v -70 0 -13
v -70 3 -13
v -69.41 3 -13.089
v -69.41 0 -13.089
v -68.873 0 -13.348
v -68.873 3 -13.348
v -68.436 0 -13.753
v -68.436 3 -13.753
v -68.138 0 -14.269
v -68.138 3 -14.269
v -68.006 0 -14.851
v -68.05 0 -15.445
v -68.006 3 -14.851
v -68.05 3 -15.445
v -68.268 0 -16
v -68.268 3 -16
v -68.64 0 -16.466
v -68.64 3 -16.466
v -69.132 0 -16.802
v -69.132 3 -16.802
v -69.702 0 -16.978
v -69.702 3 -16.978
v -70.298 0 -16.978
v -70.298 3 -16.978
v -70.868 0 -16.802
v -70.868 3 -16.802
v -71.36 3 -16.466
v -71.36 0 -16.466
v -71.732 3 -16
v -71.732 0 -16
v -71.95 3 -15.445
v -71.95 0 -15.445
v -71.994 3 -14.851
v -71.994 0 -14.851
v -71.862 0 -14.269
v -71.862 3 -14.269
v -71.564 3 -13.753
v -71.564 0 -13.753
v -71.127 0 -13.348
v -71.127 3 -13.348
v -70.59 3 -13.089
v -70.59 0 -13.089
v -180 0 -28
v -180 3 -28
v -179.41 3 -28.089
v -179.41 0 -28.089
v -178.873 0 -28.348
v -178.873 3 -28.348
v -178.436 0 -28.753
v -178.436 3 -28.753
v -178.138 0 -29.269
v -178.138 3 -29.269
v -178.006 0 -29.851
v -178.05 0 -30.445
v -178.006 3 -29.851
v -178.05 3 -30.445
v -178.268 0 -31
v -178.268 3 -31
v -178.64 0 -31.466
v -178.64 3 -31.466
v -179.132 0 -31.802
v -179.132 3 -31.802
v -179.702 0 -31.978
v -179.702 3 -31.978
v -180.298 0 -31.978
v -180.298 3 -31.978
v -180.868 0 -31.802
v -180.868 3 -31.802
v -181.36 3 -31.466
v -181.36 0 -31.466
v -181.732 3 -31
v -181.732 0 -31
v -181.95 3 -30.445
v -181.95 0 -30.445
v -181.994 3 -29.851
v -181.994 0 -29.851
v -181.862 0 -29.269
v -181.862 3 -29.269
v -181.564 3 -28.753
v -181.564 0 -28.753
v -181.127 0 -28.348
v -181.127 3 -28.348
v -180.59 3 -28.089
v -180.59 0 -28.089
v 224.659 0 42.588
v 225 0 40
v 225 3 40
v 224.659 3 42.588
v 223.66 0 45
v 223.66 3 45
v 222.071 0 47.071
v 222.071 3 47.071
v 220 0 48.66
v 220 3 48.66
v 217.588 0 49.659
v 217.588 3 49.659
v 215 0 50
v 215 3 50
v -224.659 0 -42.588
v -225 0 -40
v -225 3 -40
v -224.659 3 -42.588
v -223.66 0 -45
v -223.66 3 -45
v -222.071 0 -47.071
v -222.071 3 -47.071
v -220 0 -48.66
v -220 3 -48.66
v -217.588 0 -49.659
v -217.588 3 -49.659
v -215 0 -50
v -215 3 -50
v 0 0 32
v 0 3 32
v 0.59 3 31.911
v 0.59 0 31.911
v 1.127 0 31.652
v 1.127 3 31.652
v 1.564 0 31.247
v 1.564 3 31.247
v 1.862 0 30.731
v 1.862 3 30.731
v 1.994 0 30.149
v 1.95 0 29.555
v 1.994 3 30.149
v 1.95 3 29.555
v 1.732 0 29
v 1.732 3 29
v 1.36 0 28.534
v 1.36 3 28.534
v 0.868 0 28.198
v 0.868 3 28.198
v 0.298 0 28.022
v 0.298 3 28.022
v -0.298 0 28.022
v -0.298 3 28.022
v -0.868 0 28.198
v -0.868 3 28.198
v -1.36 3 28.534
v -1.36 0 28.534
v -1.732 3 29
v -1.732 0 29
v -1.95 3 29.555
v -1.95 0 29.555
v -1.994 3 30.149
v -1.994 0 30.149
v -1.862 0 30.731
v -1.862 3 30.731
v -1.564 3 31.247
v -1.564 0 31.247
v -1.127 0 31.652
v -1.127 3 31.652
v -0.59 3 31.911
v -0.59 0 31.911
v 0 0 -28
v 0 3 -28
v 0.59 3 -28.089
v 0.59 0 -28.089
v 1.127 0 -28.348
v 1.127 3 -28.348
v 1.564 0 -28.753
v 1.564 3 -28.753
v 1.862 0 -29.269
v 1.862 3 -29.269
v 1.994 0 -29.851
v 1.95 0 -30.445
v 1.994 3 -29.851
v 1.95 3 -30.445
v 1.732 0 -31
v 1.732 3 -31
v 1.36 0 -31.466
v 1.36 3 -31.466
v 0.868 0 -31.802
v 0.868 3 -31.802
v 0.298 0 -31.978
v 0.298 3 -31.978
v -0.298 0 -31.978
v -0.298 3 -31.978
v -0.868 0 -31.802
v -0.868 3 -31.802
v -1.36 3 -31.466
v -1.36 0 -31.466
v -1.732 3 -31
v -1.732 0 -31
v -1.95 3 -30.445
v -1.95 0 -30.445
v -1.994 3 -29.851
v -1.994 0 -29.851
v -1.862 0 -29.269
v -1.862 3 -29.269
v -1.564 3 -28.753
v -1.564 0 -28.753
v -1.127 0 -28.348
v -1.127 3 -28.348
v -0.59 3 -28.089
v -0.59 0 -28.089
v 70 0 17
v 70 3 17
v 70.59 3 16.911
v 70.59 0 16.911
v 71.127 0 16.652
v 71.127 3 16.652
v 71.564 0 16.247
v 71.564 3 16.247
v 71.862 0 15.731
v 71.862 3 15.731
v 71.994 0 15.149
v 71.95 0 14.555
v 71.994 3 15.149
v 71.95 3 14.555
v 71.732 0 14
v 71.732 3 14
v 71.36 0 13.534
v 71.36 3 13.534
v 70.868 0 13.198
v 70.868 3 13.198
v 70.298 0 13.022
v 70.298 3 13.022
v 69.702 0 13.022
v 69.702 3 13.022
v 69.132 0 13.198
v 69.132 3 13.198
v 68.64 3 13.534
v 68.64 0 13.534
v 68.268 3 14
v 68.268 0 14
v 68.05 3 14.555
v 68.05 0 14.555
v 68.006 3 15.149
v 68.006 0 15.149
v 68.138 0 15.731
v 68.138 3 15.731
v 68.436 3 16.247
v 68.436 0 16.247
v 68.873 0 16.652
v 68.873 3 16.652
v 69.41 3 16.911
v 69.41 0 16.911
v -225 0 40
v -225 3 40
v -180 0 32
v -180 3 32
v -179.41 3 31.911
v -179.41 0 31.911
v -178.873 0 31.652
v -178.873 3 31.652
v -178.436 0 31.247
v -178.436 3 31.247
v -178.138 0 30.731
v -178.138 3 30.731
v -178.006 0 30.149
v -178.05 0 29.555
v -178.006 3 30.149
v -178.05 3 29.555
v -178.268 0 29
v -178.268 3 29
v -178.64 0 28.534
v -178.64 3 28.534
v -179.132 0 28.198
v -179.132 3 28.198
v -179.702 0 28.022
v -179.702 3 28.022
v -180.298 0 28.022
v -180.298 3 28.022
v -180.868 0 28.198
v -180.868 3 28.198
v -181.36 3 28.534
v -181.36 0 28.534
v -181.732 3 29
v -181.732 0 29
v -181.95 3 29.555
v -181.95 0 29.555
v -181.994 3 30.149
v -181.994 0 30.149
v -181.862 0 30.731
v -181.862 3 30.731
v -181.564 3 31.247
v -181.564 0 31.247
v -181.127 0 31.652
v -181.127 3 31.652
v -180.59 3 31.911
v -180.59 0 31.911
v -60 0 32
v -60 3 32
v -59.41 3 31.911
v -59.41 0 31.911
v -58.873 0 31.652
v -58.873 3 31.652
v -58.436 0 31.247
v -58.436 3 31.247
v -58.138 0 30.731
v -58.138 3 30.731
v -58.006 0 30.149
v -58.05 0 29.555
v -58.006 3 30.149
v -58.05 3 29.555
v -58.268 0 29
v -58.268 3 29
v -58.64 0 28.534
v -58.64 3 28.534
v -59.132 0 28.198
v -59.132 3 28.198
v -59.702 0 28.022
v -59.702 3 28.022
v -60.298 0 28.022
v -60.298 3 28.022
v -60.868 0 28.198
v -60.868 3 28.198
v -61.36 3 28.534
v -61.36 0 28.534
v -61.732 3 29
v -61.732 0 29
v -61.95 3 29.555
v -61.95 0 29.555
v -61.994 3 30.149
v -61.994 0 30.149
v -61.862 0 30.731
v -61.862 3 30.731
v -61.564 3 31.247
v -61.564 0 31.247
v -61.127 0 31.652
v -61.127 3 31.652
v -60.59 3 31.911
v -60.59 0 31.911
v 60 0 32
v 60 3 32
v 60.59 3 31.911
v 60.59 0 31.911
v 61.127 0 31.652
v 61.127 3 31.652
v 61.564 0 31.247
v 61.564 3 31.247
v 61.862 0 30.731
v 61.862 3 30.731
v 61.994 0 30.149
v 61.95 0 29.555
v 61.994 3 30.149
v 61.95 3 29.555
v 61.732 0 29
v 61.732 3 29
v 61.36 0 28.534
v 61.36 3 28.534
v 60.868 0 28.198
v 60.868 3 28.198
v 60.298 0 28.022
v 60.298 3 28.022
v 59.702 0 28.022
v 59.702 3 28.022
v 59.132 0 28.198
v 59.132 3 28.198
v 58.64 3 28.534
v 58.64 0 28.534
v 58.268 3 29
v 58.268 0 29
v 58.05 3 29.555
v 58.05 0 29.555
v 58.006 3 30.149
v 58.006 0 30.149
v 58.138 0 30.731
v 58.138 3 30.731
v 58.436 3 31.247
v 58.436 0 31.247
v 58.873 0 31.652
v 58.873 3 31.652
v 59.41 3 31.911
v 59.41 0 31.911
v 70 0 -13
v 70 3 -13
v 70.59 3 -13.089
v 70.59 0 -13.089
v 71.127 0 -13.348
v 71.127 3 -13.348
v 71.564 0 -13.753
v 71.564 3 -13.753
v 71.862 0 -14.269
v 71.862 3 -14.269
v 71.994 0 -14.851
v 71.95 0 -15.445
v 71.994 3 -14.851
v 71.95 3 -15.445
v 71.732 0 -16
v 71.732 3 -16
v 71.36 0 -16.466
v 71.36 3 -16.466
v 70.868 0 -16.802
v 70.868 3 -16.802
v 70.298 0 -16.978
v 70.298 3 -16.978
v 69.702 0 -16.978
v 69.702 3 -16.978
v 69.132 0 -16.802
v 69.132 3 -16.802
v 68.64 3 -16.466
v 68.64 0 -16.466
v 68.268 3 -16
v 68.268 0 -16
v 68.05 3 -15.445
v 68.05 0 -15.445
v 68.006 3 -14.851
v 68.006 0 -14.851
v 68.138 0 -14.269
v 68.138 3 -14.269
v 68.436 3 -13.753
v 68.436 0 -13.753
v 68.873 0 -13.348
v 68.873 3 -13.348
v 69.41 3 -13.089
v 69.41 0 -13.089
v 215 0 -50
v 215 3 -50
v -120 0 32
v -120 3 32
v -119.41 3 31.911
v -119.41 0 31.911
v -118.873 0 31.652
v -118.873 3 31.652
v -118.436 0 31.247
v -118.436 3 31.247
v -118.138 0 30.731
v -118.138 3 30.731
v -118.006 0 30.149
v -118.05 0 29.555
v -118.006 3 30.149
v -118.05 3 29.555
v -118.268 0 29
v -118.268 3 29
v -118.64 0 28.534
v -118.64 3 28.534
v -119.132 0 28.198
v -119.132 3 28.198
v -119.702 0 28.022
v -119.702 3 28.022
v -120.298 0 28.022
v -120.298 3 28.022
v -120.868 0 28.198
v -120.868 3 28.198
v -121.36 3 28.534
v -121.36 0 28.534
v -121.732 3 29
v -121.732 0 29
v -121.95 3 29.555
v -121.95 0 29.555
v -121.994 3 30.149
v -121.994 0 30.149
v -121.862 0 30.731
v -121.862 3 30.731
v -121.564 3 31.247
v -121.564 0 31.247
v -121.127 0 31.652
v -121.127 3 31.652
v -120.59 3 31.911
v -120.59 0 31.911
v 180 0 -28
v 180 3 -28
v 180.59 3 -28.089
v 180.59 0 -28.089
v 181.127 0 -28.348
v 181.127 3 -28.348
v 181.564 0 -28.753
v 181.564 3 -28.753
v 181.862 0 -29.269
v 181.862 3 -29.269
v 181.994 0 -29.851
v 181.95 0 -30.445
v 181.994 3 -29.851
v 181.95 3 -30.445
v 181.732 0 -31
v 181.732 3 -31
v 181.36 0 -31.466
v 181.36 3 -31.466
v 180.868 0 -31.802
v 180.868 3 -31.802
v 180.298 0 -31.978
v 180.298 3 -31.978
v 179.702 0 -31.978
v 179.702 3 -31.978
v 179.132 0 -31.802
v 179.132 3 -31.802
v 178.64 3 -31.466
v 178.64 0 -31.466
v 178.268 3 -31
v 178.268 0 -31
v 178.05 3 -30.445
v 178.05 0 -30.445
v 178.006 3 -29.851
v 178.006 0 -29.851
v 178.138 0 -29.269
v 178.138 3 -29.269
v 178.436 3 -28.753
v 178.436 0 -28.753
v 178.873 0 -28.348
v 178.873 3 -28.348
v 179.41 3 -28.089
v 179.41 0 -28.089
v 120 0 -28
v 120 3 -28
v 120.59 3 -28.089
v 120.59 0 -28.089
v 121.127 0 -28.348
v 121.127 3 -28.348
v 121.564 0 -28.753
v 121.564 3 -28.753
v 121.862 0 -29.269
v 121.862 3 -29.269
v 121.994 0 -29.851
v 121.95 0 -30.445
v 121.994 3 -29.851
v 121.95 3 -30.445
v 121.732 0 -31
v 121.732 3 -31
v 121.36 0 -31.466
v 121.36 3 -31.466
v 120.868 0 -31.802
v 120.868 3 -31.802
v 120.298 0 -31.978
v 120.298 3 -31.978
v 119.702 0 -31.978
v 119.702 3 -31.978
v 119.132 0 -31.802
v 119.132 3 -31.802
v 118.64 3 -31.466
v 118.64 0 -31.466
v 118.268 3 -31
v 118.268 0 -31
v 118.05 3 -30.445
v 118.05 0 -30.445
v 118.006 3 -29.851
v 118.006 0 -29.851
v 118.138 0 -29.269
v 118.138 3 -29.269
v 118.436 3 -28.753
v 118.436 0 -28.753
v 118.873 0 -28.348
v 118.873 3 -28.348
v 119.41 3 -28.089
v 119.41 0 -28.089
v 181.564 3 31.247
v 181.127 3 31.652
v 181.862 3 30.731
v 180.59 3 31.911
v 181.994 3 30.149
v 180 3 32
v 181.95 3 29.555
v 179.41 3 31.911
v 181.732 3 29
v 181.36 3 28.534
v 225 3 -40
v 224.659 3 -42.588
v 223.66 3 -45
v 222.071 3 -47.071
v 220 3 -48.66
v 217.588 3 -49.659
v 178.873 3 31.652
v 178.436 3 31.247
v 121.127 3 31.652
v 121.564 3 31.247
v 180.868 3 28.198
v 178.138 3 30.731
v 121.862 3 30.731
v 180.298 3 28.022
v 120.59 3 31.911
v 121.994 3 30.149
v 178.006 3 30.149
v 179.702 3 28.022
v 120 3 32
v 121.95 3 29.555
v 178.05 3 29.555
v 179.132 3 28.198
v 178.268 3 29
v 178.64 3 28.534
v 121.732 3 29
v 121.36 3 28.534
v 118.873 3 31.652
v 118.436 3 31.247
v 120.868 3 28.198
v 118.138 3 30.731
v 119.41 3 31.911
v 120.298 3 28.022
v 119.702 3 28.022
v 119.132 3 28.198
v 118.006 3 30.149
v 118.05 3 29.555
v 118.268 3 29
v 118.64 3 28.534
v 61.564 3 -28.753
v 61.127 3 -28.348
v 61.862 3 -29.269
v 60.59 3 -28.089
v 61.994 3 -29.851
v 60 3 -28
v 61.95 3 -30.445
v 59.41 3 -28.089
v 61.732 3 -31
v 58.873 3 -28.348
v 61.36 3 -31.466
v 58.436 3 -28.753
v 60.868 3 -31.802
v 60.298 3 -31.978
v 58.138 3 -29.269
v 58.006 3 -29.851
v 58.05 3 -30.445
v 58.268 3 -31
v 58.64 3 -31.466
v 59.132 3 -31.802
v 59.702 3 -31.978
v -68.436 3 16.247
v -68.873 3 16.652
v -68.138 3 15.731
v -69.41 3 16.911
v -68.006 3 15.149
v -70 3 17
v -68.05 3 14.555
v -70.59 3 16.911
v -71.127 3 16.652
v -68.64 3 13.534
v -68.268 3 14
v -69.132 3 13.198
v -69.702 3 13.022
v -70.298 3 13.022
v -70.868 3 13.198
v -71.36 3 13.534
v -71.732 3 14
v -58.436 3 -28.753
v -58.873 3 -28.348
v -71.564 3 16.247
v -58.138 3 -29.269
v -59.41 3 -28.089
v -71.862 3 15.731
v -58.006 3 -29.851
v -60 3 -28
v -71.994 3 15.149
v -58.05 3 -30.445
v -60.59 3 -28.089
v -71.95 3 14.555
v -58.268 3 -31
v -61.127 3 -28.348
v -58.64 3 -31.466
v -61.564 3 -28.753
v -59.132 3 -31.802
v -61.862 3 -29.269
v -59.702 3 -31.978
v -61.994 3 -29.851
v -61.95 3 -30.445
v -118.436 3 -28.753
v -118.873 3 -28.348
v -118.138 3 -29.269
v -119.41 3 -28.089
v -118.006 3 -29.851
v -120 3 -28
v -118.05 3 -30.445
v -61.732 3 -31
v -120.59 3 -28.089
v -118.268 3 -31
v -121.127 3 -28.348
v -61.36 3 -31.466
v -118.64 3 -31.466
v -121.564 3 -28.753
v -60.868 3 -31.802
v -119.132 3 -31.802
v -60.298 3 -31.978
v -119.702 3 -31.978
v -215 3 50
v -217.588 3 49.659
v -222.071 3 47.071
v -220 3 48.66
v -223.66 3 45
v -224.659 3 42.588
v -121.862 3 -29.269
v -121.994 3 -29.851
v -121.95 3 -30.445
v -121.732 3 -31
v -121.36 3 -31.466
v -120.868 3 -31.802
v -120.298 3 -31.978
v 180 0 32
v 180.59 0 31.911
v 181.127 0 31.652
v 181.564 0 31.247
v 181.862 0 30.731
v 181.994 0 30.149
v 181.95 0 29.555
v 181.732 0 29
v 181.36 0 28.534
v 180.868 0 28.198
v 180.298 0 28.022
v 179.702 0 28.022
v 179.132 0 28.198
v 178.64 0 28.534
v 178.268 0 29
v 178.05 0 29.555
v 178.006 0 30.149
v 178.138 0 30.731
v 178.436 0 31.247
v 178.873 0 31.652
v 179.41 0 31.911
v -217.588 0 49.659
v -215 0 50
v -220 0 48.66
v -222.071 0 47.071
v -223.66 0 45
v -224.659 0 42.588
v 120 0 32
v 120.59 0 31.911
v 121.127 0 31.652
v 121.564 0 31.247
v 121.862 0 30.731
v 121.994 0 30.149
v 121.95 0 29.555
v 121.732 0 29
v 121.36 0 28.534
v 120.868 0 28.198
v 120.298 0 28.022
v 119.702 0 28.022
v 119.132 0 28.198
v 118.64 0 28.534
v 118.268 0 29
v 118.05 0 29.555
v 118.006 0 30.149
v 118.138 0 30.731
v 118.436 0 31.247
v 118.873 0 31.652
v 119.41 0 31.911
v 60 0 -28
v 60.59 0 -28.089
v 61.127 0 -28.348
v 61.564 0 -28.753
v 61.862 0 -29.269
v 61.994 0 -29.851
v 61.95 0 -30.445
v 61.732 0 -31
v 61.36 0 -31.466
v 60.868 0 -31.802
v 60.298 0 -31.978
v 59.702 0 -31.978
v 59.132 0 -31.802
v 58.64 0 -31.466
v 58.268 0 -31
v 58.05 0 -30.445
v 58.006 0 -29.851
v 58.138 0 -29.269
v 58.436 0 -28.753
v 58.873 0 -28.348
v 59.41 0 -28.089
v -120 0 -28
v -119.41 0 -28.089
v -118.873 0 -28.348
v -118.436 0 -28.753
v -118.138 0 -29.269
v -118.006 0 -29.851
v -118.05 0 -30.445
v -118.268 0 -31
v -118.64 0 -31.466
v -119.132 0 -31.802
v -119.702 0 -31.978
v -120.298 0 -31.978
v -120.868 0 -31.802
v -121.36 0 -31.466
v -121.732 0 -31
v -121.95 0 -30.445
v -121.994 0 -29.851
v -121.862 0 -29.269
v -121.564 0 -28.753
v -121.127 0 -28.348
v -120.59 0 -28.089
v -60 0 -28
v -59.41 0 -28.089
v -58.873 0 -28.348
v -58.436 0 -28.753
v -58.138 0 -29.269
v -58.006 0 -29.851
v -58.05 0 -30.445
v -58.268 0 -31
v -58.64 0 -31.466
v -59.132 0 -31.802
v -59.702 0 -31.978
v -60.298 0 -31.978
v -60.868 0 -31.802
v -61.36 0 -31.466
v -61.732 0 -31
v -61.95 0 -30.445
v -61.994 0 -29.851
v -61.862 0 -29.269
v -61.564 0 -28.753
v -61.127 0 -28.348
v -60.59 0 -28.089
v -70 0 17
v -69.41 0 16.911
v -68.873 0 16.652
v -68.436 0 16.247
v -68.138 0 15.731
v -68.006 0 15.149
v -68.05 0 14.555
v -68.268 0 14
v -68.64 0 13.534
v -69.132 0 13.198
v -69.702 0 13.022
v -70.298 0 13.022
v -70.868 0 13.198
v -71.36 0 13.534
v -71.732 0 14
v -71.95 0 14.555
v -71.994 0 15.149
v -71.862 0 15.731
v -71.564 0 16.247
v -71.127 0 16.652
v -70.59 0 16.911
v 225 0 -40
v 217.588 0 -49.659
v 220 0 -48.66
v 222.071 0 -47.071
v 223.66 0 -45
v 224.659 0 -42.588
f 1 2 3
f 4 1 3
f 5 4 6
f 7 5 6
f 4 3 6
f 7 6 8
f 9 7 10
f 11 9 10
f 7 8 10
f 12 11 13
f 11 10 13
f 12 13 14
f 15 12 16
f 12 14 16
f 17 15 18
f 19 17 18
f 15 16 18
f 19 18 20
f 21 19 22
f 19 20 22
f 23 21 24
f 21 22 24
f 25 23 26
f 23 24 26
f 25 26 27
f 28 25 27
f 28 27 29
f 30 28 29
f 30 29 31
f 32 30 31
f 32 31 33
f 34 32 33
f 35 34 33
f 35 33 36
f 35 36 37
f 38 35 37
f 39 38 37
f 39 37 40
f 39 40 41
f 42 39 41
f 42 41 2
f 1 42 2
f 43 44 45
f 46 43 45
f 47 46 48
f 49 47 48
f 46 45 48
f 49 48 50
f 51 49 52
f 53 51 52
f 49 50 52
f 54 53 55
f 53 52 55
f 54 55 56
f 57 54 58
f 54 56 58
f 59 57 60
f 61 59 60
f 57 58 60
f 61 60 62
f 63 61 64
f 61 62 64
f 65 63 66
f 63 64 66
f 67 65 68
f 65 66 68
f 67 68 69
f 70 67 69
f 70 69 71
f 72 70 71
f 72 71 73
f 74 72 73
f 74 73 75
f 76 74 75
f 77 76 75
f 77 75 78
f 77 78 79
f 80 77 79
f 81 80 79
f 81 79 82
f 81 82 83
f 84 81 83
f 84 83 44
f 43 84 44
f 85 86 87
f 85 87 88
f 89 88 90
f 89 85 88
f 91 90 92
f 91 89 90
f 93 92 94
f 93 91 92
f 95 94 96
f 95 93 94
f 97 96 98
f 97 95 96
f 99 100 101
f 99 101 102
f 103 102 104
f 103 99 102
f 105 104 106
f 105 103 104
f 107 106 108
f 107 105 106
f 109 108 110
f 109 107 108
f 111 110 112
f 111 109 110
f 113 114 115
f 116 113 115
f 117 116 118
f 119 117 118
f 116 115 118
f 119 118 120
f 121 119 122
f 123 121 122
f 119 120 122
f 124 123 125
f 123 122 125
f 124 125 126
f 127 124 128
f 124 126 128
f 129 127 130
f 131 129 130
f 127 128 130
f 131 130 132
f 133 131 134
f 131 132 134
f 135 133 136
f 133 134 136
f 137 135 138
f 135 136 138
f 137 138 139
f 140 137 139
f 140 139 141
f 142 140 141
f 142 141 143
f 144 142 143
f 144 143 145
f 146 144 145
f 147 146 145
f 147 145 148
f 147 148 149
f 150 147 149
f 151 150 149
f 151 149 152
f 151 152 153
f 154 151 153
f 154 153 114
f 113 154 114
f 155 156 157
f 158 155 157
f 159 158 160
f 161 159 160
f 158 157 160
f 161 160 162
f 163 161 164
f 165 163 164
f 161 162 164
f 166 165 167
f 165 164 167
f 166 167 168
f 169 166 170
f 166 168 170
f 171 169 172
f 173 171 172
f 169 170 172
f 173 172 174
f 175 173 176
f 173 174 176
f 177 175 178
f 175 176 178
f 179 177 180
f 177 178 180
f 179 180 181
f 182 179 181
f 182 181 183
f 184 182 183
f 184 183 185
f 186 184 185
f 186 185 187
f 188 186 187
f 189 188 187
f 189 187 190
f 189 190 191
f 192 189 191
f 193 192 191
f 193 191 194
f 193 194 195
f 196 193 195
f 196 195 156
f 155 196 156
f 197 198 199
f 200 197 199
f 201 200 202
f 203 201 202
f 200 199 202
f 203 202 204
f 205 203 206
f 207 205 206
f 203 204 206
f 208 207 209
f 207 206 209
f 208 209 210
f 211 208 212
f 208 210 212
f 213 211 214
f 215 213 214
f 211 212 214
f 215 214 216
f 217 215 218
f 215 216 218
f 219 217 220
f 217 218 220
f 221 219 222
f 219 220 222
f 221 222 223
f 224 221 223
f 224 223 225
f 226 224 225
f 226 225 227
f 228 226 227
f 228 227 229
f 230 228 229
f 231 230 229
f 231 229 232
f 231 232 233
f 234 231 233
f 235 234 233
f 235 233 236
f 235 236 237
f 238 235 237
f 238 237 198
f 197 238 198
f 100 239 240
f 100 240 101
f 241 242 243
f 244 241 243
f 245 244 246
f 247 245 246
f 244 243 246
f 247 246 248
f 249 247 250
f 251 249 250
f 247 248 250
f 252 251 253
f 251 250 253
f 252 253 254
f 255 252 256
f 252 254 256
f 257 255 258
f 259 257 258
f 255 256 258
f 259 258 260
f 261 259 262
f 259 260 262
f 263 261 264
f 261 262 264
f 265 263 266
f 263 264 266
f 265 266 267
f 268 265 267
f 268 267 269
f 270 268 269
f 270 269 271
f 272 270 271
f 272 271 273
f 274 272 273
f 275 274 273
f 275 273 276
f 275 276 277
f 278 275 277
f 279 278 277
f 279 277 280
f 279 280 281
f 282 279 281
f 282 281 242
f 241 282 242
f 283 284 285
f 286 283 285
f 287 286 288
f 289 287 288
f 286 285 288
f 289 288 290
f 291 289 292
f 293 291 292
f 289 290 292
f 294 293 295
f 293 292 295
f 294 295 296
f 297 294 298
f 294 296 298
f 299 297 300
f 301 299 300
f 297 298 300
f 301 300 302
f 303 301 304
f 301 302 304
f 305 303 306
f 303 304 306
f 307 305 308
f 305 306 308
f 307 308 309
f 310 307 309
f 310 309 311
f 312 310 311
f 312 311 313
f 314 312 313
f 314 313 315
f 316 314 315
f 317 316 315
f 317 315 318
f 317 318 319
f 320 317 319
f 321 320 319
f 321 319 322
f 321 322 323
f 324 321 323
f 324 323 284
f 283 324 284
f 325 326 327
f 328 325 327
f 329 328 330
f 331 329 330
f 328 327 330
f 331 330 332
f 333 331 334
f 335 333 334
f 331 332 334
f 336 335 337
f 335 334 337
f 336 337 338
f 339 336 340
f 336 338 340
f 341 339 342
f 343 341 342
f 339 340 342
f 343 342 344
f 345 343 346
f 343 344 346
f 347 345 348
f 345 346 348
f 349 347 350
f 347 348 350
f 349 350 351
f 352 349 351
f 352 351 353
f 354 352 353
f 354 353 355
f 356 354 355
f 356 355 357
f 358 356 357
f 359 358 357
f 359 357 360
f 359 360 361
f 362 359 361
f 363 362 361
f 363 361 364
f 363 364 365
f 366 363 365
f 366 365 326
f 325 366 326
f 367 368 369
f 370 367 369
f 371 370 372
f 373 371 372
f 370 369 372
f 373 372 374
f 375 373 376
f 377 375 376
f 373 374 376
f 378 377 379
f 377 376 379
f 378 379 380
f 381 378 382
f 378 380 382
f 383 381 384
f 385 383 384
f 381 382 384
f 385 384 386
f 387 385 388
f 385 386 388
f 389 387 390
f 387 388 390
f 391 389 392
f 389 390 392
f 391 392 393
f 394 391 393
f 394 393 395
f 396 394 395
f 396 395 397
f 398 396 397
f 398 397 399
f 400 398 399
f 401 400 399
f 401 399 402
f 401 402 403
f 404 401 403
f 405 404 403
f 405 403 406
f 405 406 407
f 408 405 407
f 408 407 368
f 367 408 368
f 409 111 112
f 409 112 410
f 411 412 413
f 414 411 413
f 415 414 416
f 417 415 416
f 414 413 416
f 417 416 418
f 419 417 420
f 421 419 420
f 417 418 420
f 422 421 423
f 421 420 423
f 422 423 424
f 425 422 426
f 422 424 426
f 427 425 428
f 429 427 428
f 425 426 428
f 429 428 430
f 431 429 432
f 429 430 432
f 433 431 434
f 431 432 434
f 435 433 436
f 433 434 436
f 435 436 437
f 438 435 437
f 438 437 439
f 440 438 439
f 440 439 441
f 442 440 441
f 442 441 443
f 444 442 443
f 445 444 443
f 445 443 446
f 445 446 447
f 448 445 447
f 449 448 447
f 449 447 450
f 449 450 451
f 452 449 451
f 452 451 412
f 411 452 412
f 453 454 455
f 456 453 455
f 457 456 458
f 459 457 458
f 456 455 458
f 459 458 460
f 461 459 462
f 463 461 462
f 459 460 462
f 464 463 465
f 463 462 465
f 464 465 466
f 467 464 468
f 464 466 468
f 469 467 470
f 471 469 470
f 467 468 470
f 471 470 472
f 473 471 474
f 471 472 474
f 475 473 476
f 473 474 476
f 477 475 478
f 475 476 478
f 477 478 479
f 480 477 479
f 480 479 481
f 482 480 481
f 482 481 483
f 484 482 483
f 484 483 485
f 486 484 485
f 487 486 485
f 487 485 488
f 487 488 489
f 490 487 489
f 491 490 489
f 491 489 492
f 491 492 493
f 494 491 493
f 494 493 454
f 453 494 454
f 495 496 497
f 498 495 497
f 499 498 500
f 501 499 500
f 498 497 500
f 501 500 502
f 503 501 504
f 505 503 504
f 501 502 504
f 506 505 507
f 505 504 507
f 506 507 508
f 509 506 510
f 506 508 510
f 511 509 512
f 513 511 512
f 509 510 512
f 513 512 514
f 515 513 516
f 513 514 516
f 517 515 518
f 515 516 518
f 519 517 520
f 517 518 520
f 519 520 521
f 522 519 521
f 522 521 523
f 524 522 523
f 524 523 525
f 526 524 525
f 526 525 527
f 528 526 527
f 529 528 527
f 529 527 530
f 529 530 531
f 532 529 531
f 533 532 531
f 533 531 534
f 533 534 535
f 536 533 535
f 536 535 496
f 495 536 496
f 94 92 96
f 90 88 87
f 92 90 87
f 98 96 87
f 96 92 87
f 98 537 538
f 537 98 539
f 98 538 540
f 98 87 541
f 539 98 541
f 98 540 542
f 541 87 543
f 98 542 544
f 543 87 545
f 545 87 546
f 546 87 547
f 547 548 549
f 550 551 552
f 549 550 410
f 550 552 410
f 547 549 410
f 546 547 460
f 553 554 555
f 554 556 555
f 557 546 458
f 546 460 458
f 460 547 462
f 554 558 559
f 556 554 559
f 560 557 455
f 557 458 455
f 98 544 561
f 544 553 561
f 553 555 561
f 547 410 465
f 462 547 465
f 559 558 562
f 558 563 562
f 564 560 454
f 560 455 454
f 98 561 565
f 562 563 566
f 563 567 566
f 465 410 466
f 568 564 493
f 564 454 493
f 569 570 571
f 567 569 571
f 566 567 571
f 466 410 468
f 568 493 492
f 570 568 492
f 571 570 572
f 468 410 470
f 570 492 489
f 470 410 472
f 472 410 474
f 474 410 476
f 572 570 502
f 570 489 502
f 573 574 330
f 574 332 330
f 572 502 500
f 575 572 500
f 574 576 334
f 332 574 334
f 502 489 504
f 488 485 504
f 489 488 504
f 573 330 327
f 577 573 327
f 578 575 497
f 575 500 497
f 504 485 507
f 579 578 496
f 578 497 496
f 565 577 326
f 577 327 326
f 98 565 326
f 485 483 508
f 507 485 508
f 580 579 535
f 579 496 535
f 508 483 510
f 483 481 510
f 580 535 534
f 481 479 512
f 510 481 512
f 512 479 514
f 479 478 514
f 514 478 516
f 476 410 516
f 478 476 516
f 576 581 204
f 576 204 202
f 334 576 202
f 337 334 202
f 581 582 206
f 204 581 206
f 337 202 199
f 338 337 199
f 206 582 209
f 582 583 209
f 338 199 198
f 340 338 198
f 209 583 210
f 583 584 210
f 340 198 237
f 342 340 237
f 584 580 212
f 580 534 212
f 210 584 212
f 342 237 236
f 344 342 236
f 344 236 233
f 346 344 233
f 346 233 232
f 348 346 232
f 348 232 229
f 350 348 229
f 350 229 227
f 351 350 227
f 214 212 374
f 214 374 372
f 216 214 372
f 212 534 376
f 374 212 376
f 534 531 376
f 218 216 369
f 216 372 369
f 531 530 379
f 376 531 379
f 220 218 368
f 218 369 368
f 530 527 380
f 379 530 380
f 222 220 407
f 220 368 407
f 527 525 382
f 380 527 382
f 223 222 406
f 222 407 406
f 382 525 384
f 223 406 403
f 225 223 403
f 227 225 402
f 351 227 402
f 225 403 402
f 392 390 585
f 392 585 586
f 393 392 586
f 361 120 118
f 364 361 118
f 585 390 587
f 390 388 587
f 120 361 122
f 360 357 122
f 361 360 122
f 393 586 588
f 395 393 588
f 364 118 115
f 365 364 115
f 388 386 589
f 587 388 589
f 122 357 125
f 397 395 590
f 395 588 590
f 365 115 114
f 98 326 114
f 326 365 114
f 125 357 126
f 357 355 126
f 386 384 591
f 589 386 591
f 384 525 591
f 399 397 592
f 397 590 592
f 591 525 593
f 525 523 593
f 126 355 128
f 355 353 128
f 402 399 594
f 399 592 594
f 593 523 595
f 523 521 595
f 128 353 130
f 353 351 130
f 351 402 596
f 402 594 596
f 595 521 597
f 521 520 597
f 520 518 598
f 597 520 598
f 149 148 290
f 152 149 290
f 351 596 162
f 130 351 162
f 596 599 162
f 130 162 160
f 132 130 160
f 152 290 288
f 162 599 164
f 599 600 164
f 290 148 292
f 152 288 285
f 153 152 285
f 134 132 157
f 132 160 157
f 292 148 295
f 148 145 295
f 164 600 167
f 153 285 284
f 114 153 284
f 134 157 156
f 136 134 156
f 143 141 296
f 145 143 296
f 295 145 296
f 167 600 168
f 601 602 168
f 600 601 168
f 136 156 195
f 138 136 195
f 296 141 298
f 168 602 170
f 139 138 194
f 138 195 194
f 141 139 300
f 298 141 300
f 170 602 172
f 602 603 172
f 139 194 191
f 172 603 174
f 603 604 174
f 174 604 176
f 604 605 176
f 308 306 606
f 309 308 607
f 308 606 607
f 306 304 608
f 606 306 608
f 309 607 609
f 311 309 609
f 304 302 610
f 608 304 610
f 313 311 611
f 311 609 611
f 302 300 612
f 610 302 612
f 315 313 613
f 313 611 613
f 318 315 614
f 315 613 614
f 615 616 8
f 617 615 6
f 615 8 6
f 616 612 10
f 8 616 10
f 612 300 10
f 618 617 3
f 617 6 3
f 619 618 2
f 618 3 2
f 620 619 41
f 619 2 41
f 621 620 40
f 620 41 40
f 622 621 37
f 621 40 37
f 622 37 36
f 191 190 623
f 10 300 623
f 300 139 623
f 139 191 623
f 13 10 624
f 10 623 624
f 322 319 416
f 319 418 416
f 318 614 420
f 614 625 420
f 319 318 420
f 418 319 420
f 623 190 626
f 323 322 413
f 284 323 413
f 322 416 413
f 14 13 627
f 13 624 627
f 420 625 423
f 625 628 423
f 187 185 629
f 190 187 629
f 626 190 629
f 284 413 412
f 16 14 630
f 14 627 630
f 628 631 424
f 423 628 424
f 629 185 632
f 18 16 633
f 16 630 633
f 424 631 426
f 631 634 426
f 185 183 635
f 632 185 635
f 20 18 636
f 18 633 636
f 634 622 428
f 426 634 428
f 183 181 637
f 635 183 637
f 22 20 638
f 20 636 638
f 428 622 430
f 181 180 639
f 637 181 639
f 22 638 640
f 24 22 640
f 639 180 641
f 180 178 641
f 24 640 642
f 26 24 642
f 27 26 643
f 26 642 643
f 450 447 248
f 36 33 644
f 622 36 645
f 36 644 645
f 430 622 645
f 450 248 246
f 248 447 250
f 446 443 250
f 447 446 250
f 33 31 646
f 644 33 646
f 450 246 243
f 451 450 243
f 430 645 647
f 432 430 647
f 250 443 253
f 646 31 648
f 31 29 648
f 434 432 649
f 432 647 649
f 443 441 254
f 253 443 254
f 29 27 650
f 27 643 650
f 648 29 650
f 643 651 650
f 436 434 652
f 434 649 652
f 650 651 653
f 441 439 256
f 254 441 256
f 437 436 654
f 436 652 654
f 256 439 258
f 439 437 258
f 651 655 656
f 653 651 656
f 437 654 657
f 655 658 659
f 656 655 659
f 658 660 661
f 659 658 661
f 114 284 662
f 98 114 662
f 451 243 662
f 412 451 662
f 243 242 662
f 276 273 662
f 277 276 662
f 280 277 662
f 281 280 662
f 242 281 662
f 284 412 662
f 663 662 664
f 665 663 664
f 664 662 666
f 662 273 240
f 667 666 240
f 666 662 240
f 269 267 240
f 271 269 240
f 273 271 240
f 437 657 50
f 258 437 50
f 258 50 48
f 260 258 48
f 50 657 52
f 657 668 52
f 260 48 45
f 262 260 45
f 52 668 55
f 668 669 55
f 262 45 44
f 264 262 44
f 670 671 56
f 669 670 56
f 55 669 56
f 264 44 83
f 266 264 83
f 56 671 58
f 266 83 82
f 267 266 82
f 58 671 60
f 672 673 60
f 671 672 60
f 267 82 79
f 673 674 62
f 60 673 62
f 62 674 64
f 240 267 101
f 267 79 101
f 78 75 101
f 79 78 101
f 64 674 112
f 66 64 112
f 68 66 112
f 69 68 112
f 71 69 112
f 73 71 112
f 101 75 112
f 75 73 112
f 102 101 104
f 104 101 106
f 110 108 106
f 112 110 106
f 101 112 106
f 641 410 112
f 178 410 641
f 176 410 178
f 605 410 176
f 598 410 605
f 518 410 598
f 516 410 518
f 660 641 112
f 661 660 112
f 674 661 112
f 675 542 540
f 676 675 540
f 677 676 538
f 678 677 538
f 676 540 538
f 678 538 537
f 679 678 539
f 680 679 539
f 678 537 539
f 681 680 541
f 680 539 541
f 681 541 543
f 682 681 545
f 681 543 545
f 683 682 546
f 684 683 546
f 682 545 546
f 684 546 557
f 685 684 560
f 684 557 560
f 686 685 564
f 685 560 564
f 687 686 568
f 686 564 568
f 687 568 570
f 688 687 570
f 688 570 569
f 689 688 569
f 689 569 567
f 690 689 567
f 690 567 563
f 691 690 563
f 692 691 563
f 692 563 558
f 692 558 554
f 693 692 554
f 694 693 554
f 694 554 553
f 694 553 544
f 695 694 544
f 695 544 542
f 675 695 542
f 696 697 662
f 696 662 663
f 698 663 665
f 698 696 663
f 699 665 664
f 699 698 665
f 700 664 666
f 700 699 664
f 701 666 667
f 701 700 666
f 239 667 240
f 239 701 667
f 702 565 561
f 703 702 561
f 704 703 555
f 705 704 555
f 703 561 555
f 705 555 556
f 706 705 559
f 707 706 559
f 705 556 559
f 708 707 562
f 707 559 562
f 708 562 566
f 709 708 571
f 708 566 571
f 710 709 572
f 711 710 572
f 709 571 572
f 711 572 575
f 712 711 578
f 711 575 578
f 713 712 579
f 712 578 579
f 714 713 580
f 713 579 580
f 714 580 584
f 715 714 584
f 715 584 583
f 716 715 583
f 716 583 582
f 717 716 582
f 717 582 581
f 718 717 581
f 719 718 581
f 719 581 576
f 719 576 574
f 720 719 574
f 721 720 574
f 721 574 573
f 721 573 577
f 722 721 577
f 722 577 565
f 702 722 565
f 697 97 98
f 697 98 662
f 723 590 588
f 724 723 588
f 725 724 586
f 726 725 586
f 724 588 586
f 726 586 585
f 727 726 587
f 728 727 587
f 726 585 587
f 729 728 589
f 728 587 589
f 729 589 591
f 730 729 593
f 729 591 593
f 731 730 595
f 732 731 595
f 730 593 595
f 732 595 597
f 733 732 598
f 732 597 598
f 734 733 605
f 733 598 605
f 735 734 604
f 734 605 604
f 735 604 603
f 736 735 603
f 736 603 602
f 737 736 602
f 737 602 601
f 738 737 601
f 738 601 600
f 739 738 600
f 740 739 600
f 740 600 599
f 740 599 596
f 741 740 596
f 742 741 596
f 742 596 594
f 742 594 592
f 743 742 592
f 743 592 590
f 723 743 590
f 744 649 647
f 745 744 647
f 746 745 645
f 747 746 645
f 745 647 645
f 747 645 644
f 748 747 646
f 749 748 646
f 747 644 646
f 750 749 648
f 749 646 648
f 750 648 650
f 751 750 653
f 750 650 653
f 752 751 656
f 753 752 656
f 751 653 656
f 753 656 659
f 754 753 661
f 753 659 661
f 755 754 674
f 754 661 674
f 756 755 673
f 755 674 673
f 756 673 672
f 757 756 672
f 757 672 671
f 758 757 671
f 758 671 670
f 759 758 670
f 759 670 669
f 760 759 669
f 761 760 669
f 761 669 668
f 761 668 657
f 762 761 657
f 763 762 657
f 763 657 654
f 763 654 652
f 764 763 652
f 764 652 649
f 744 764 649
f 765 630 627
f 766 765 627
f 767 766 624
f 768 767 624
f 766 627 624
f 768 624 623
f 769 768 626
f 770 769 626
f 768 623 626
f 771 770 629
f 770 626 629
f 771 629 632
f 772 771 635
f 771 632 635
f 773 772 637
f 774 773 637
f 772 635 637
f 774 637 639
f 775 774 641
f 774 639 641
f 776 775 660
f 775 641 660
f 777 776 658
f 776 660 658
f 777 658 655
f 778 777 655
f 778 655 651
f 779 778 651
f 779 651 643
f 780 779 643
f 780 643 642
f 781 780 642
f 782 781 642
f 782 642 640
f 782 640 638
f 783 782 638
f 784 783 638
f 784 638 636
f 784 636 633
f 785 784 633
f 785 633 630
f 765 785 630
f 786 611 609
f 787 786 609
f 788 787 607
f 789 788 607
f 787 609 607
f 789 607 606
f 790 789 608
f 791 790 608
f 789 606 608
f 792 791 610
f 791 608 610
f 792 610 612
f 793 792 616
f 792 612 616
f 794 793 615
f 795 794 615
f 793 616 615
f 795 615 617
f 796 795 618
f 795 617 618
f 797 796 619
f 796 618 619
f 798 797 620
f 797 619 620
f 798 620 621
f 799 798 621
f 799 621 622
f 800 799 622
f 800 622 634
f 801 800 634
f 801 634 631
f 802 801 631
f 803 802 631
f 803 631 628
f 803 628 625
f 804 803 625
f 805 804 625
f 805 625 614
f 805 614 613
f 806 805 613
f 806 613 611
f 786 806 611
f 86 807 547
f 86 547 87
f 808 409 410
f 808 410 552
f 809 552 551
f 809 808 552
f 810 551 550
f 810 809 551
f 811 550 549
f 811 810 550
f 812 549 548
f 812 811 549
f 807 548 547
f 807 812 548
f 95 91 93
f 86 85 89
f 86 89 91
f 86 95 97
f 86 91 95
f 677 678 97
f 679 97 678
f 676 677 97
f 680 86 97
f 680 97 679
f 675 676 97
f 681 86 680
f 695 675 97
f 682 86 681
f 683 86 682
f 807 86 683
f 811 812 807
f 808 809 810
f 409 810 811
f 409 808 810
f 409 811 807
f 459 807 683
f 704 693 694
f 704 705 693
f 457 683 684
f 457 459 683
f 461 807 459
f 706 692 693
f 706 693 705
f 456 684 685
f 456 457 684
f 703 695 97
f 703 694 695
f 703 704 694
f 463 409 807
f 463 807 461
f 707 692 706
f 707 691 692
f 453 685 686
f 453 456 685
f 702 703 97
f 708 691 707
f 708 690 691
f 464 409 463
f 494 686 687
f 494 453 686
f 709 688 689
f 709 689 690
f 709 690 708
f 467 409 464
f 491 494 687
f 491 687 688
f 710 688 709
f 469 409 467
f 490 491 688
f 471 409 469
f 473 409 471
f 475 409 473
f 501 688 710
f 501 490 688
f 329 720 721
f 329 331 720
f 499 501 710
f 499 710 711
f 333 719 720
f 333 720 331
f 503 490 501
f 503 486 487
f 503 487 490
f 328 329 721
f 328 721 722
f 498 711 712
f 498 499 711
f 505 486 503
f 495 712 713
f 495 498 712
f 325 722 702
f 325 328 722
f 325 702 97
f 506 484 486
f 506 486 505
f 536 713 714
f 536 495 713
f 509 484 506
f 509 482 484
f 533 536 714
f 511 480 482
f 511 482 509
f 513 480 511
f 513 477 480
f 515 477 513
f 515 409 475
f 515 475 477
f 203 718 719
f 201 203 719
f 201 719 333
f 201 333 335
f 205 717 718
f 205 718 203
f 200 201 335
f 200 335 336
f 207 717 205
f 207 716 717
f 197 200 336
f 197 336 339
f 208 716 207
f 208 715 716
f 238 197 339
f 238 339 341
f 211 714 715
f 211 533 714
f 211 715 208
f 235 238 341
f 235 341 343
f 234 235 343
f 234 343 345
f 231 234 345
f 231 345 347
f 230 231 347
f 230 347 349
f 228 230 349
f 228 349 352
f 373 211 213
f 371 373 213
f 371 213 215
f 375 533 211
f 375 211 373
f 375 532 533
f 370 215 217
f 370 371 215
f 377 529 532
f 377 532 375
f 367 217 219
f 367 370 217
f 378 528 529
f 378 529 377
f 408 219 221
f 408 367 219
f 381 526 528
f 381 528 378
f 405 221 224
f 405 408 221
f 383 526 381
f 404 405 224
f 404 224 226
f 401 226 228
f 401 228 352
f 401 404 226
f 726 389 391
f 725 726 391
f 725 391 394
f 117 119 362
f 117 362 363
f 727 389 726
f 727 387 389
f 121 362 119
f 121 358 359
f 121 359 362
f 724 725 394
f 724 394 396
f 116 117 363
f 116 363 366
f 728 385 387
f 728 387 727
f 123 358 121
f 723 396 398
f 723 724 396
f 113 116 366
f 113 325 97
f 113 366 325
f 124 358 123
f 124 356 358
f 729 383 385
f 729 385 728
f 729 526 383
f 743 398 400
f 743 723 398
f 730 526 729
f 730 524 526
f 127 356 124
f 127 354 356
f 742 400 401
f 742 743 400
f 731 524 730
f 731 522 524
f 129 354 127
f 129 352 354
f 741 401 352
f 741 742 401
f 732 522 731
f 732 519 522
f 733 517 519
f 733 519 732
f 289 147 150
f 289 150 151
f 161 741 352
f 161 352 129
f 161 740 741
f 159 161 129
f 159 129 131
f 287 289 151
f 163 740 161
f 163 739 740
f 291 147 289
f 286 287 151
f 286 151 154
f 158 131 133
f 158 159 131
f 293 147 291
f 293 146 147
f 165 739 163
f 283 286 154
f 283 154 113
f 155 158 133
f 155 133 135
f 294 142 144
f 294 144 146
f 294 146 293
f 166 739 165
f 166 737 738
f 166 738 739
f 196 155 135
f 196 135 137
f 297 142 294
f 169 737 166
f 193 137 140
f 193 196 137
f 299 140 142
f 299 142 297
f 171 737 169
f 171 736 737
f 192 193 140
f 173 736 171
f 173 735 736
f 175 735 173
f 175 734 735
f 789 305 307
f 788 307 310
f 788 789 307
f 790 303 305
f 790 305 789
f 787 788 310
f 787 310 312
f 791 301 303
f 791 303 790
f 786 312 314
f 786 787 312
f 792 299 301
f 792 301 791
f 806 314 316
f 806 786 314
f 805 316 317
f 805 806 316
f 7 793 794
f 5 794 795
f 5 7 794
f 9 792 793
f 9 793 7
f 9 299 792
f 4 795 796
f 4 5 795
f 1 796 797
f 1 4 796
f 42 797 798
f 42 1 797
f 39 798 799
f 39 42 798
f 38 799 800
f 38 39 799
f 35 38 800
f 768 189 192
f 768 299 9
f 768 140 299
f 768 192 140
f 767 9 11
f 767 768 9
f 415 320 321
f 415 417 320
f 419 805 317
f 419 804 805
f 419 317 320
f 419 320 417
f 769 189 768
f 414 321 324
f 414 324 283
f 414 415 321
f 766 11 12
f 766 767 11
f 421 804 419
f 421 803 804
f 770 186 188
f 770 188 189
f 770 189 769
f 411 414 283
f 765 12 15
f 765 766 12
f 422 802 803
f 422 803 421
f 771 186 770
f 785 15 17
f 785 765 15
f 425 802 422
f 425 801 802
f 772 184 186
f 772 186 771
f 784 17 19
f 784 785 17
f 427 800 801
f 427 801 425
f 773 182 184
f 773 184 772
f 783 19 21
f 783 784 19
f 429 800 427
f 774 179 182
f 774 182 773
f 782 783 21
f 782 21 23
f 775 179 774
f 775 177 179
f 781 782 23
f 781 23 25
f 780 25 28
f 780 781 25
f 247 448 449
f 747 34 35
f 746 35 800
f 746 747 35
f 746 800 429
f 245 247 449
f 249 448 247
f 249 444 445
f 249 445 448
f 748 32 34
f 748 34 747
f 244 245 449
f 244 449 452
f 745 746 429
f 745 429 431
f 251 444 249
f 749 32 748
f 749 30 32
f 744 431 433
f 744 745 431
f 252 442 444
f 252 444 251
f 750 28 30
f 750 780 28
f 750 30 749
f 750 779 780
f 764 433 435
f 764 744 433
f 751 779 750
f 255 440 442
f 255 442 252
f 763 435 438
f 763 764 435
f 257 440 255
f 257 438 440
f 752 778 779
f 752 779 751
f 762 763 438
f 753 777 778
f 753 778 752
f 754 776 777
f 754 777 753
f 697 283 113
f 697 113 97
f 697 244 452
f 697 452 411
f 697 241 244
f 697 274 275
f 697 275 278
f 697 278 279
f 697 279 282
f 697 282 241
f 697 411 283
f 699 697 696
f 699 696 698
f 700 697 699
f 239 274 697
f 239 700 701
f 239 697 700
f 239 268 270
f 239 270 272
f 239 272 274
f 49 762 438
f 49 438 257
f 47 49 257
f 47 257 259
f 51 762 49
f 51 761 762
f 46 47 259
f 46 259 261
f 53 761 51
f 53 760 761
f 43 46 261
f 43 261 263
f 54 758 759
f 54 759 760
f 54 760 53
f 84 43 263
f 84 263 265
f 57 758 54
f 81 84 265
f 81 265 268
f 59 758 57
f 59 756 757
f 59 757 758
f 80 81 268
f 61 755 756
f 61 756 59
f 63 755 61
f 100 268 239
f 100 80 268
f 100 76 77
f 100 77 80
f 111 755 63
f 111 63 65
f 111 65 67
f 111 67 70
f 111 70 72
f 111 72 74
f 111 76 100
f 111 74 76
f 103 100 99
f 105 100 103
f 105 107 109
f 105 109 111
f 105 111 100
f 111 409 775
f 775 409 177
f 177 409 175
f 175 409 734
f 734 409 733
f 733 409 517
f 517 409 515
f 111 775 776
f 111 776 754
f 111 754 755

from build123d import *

# Parameters (mm, degrees)
EXTRUDE_1_DEPTH     = 3
SKETCH_2_R          = 2
CUT_EXTRUDE_1_DEPTH = 231.508134347
SKETCH_3_R          = 2
CUT_EXTRUDE_2_DEPTH = 231.508134347
SKETCH_4_R          = 2
CUT_EXTRUDE_3_DEPTH = 231.508134347


with BuildPart() as part:
    # 草图1 → 凸台-拉伸1 (new body)
    with BuildSketch(Plane(origin=(0, 0, 0), x_dir=(1, 0, 0), z_dir=(0, 1, 0))):
        with BuildLine():
            Line((-215, 50), (215, 50))
            ThreePointArc((215, 50), (222.071067812, 47.071067812), (225, 40))
            Line((225, 40), (225, -40))
            ThreePointArc((225, -40), (222.071067812, -47.071067812), (215, -50))
            Line((215, -50), (-215, -50))
            ThreePointArc((-215, -50), (-222.071067812, -47.071067812), (-225, -40))
            Line((-225, -40), (-225, 40))
            ThreePointArc((-225, 40), (-222.071067812, 47.071067812), (-215, 50))
        make_face()
    extrude(amount=EXTRUDE_1_DEPTH)

    # 草图2 → 切除-拉伸1 (cut, through all)
    with BuildSketch(Plane(origin=(0, 3, 0), x_dir=(1, 0, 0), z_dir=(0, 1, 0))):
        with Locations(Location((-180, -30, 0), (0, 0, 270))):
            Circle(SKETCH_2_R)
        with Locations(Location((-120, -30, 0), (0, 0, 270))):
            Circle(SKETCH_2_R)
        with Locations(Location((-60, -30, 0), (0, 0, 270))):
            Circle(SKETCH_2_R)
        with Locations(Location((0, -30, 0), (0, 0, 270))):
            Circle(SKETCH_2_R)
        with Locations(Location((60, -30, 0), (0, 0, 270))):
            Circle(SKETCH_2_R)
        with Locations(Location((120, -30, 0), (0, 0, 270))):
            Circle(SKETCH_2_R)
        with Locations(Location((180, -30, 0), (0, 0, 270))):
            Circle(SKETCH_2_R)
    extrude(amount=-CUT_EXTRUDE_1_DEPTH, mode=Mode.SUBTRACT)

    # 草图3 → 切除-拉伸2 (cut, through all)
    with BuildSketch(Plane(origin=(0, 3, 0), x_dir=(1, 0, 0), z_dir=(0, 1, 0))):
        with Locations(Location((-180, 30, 0), (0, 0, 270))):
            Circle(SKETCH_3_R)
        with Locations(Location((-120, 30, 0), (0, 0, 270))):
            Circle(SKETCH_3_R)
        with Locations(Location((-60, 30, 0), (0, 0, 270))):
            Circle(SKETCH_3_R)
        with Locations(Location((0, 30, 0), (0, 0, 270))):
            Circle(SKETCH_3_R)
        with Locations(Location((60, 30, 0), (0, 0, 270))):
            Circle(SKETCH_3_R)
        with Locations(Location((120, 30, 0), (0, 0, 270))):
            Circle(SKETCH_3_R)
        with Locations(Location((180, 30, 0), (0, 0, 270))):
            Circle(SKETCH_3_R)
    extrude(amount=-CUT_EXTRUDE_2_DEPTH, mode=Mode.SUBTRACT)

    # 草图4 → 切除-拉伸3 (cut, through all)
    with BuildSketch(Plane(origin=(0, 3, 0), x_dir=(1, 0, 0), z_dir=(0, 1, 0))):
        with Locations(Location((-70, 15, 0), (0, 0, 270))):
            Circle(SKETCH_4_R)
        with Locations(Location((70, 15, 0), (0, 0, 270))):
            Circle(SKETCH_4_R)
        with Locations(Location((-70, -15, 0), (0, 0, 270))):
            Circle(SKETCH_4_R)
        with Locations(Location((70, -15, 0), (0, 0, 270))):
            Circle(SKETCH_4_R)
    extrude(amount=-CUT_EXTRUDE_3_DEPTH, mode=Mode.SUBTRACT)


solid = part.part
